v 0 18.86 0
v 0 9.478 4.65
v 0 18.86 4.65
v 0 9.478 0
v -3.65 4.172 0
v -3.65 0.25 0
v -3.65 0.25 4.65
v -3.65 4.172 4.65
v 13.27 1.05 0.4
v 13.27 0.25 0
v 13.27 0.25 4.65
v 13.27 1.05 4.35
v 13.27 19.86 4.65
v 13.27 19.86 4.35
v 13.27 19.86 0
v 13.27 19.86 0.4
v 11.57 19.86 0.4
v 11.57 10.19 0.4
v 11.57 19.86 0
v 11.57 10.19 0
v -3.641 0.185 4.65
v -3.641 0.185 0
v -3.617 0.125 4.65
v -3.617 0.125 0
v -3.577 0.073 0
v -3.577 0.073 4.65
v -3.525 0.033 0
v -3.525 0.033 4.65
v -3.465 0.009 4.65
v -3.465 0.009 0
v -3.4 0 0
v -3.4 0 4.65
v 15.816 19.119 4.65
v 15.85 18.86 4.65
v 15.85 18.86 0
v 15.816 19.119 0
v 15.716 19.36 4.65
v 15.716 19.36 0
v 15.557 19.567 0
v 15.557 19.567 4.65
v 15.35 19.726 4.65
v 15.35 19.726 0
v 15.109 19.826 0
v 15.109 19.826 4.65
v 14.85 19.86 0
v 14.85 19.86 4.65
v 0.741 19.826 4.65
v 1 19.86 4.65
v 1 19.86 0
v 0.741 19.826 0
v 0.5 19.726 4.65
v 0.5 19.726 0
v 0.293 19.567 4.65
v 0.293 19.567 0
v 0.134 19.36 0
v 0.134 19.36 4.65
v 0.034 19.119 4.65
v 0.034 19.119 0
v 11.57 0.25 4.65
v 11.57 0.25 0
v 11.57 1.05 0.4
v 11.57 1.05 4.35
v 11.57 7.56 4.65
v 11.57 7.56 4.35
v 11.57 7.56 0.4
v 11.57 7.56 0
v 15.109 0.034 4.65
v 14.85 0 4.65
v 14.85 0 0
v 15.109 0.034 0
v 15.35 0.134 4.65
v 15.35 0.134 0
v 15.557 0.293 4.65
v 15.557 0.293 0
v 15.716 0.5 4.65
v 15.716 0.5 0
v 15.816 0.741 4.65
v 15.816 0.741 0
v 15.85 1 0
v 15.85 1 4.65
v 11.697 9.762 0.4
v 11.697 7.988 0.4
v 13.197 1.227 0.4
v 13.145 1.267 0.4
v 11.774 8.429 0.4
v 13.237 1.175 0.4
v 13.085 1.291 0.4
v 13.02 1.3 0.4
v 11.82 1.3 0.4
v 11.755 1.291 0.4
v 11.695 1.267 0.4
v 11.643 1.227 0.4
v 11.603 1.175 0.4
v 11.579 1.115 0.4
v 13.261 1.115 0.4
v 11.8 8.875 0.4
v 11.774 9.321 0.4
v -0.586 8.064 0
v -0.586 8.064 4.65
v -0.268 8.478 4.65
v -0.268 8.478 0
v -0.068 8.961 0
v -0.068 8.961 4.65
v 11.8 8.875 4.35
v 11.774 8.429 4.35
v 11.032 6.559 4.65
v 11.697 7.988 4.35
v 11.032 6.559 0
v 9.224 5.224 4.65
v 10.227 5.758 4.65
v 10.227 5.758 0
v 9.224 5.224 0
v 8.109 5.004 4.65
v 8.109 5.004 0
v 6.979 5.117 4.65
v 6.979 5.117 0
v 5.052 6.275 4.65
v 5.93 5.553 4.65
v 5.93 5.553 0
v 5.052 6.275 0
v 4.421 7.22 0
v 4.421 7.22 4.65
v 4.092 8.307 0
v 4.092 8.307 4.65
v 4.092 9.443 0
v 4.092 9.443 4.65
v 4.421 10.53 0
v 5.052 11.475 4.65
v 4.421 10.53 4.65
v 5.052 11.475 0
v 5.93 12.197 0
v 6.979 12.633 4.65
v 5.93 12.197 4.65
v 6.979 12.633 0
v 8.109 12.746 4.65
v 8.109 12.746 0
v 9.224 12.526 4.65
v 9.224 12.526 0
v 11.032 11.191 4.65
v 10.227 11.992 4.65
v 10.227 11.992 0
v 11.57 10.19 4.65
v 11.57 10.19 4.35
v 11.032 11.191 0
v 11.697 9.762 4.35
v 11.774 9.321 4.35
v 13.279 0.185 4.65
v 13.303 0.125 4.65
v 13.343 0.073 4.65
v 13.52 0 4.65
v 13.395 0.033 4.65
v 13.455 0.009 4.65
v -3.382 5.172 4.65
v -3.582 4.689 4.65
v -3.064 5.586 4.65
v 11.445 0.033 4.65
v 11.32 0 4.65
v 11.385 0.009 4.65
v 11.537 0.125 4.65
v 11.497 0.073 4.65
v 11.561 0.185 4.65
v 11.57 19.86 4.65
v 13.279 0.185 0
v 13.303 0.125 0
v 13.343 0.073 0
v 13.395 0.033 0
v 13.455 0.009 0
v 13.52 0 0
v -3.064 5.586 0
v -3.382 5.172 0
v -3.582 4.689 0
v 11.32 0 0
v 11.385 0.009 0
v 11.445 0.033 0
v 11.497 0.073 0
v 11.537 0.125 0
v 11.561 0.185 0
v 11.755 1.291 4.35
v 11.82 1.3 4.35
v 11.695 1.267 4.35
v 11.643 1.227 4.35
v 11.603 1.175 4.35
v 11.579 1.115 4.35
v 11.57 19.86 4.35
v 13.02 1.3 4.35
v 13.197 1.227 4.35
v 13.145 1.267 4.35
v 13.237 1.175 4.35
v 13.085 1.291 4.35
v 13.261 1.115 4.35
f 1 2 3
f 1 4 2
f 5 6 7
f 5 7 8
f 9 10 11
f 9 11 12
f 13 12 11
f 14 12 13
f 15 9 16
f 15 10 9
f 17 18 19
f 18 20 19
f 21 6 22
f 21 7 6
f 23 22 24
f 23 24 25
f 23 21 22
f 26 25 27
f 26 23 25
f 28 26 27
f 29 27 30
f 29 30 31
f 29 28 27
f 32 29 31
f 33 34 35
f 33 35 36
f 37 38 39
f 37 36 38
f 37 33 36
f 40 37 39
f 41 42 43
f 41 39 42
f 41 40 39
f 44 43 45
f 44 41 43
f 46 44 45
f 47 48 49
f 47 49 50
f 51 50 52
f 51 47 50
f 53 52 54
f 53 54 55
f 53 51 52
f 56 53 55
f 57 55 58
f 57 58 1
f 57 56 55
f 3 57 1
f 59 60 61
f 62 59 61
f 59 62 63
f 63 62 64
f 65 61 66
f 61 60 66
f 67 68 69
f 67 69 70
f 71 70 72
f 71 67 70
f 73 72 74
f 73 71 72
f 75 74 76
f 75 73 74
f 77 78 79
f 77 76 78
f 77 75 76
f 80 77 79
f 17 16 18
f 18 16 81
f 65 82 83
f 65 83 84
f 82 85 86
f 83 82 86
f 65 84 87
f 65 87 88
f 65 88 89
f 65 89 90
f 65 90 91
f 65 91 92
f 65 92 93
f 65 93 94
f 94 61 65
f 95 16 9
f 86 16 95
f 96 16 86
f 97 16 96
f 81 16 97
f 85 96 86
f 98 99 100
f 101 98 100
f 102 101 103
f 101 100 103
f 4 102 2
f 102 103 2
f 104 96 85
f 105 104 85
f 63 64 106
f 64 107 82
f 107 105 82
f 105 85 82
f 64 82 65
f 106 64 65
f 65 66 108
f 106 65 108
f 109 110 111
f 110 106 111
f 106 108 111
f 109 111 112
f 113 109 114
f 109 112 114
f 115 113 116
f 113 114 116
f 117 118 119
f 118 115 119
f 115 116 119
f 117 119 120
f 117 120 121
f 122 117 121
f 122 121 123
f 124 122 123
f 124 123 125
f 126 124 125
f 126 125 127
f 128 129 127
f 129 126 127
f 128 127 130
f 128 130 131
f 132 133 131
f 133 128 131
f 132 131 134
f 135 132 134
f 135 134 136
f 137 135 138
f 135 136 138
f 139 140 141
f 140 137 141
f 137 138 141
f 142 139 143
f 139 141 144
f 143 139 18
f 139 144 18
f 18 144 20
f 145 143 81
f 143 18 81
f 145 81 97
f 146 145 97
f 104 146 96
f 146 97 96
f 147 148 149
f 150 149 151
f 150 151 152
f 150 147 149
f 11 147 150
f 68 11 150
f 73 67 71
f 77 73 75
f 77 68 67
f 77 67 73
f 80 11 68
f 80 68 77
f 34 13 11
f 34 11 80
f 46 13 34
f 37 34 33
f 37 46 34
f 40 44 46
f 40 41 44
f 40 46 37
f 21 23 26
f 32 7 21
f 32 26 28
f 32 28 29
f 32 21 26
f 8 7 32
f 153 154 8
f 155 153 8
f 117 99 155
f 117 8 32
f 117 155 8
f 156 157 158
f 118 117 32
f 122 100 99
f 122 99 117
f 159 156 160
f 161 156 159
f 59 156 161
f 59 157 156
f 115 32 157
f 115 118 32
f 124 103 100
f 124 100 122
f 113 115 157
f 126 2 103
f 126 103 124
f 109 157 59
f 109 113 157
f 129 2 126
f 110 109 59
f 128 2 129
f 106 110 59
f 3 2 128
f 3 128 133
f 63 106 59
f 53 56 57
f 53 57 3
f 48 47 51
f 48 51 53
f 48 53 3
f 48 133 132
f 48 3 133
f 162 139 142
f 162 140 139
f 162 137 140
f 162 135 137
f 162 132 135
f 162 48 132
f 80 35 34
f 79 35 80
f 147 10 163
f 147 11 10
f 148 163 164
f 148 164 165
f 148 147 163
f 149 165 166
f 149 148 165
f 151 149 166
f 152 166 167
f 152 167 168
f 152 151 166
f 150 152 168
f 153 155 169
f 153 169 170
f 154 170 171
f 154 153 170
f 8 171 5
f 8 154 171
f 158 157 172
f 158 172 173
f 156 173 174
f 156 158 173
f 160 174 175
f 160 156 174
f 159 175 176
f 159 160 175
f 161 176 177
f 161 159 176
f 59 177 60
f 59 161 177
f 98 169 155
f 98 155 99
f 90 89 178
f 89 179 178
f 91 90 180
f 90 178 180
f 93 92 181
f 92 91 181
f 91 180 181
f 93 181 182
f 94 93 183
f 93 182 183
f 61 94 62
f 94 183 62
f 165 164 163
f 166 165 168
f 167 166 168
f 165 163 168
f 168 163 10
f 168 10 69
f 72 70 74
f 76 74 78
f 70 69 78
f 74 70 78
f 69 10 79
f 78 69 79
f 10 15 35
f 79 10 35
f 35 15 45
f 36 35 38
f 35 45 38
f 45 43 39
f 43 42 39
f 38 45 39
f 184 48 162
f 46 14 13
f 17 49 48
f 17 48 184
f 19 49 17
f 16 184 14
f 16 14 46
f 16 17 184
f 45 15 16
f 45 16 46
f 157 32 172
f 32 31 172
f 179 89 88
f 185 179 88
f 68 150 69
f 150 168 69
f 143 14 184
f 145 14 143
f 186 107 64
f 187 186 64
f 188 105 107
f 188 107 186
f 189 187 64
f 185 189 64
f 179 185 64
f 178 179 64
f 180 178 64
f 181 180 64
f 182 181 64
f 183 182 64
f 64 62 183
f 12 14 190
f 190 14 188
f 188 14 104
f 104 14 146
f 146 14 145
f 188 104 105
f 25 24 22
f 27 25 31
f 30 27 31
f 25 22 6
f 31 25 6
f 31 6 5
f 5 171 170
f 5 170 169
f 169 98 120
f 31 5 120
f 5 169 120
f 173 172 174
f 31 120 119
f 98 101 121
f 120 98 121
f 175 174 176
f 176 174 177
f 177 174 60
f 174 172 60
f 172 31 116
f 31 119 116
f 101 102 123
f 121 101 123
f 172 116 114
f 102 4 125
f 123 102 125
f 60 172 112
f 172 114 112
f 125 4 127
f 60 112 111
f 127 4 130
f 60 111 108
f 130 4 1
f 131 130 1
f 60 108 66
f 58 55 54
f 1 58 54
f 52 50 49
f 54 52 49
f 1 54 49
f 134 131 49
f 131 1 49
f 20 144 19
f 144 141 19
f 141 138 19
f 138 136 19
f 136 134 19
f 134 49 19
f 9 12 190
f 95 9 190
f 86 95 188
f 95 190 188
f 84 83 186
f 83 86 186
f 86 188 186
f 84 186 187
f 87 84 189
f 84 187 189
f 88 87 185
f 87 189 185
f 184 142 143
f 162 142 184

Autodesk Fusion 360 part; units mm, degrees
sketch "Skizze1" plane through (0, 0, 0) normal (0, 0, 1) x (1, 0, 0)
  line L0 (0, 19.86) -> (15.85, 19.86)
  line L1 (15.85, 19.86) -> (15.85, 0)
  circle A0 centre (7.925, 8.925) radius 3.925 construction
  line L2 (-3.65, 5) -> (15.85, 5) construction
  line L3 (4, 19.86) -> (4, 0) construction
  line L4 (0, 0) -> (4, 0)
  line L5 (4, 0) -> (11.57, 0)
  line L6 (11.85, 1.3) -> (13.27, 1.3)
  line L7 (13.27, 1.3) -> (13.27, 0)
  line L8 (13.27, 0) -> (15.85, 0)
  line L9 (11.85, 19.86) -> (11.85, 1.3) construction
  line L10 (11.57, 0) -> (11.57, 1.3)
  line L11 (11.57, 1.3) -> (11.85, 1.3)
  line L12 (11.57, 0) -> (13.27, 0) construction
  line L13 (0, 0) -> (-3.65, 0)
  line L14 (-3.65, 0) -> (-3.65, 5)
  line L15 (-3.65, 5) -> (0, 8.65)
  line L16 (0, 8.65) -> (0, 19.86)
  line L17 (0, 0) -> (0, 8.65) construction
  circle A1 centre (7.925, 8.875) radius 3.875
  line L18 (7.925, 8.875) -> (7.925, 8.925) construction
  dimension "d1" = 7.85
  dimension "d2" = 5
  dimension "d3" = 19.86
  dimension "d4" = 4
  dimension "d5" = 0.28
  dimension "d6" = 1.42
  dimension "d7" = 1.3
  dimension "d8" = 4
  dimension "d9" = 7.65
  dimension "d10" = 5
  dimension "d11" = 135
  dimension "d27" = 7.75
extrude "Extrusion1" add sketch "Skizze1" along normal blind 4.65
sketch "Skizze2" plane through (0, 0, 4.65) normal (0, 0, 1) x (-1, 0, 0)
  line L0 (3.65, 0) -> (-11.57, 0)
  line L1 (-11.57, 0) -> (-11.57, -1.3)
  line L2 (-11.57, -1.3) -> (-13.27, -1.3)
  line L3 (-13.27, -1.3) -> (-13.27, 0)
  line L4 (-13.27, 0) -> (-15.85, 0)
  line L5 (-15.85, 0) -> (-15.85, -19.86)
  line L6 (-15.85, -19.86) -> (0, -19.86)
  line L7 (0, -19.86) -> (0, -8.65)
  line L8 (0, -8.65) -> (3.65, -5)
  line L9 (3.65, -5) -> (3.65, 0)
  line L10 (-11.57, -1.3) -> (-11.57, -19.86)
  line L11 (-11.57, -1.3) -> (-13.27, -1.3)
  line L12 (-13.27, -1.3) -> (-13.27, -19.86)
  line L13 (-13.27, -19.86) -> (-11.57, -19.86)
  circle A0 centre (-7.925, -8.875) radius 3.875
extrude "Extrusion2" cut sketch "Skizze2" against normal blind 0.3 contours L2 L6 L10 L11 L12 L13 A0
extrude "Extrusion3" cut sketch "Skizze2" along normal blind 0.4 from surface at -4.65 contours L2 L6 L10 L11 L12 L13 A0
fillet "Abrundung1" radius 1 3 edges at (0, 19.86, 2.325) (15.85, 19.86, 2.325) (15.85, 0, 2.325)
fillet "Abrundung2" radius 0.25 1 edges at (-3.65, 0, 2.325)
fillet "Abrundung3" radius 2 2 edges at (-3.65, 5, 2.325) (0, 8.65, 2.325)
fillet "Abrundung4" radius 0.25 4 edges at (13.27, 0, 2.325) (11.57, 0, 2.325) (11.57, 1.3, 2.375) (13.27, 1.3, 2.375)
equation "d1 = 7.6 mm + 0.25 mm"
equation "d3 = 14 mm + 5.3 mm + 1.2 mm - 0.5 mm - 0.1 mm - 0.04 mm"
